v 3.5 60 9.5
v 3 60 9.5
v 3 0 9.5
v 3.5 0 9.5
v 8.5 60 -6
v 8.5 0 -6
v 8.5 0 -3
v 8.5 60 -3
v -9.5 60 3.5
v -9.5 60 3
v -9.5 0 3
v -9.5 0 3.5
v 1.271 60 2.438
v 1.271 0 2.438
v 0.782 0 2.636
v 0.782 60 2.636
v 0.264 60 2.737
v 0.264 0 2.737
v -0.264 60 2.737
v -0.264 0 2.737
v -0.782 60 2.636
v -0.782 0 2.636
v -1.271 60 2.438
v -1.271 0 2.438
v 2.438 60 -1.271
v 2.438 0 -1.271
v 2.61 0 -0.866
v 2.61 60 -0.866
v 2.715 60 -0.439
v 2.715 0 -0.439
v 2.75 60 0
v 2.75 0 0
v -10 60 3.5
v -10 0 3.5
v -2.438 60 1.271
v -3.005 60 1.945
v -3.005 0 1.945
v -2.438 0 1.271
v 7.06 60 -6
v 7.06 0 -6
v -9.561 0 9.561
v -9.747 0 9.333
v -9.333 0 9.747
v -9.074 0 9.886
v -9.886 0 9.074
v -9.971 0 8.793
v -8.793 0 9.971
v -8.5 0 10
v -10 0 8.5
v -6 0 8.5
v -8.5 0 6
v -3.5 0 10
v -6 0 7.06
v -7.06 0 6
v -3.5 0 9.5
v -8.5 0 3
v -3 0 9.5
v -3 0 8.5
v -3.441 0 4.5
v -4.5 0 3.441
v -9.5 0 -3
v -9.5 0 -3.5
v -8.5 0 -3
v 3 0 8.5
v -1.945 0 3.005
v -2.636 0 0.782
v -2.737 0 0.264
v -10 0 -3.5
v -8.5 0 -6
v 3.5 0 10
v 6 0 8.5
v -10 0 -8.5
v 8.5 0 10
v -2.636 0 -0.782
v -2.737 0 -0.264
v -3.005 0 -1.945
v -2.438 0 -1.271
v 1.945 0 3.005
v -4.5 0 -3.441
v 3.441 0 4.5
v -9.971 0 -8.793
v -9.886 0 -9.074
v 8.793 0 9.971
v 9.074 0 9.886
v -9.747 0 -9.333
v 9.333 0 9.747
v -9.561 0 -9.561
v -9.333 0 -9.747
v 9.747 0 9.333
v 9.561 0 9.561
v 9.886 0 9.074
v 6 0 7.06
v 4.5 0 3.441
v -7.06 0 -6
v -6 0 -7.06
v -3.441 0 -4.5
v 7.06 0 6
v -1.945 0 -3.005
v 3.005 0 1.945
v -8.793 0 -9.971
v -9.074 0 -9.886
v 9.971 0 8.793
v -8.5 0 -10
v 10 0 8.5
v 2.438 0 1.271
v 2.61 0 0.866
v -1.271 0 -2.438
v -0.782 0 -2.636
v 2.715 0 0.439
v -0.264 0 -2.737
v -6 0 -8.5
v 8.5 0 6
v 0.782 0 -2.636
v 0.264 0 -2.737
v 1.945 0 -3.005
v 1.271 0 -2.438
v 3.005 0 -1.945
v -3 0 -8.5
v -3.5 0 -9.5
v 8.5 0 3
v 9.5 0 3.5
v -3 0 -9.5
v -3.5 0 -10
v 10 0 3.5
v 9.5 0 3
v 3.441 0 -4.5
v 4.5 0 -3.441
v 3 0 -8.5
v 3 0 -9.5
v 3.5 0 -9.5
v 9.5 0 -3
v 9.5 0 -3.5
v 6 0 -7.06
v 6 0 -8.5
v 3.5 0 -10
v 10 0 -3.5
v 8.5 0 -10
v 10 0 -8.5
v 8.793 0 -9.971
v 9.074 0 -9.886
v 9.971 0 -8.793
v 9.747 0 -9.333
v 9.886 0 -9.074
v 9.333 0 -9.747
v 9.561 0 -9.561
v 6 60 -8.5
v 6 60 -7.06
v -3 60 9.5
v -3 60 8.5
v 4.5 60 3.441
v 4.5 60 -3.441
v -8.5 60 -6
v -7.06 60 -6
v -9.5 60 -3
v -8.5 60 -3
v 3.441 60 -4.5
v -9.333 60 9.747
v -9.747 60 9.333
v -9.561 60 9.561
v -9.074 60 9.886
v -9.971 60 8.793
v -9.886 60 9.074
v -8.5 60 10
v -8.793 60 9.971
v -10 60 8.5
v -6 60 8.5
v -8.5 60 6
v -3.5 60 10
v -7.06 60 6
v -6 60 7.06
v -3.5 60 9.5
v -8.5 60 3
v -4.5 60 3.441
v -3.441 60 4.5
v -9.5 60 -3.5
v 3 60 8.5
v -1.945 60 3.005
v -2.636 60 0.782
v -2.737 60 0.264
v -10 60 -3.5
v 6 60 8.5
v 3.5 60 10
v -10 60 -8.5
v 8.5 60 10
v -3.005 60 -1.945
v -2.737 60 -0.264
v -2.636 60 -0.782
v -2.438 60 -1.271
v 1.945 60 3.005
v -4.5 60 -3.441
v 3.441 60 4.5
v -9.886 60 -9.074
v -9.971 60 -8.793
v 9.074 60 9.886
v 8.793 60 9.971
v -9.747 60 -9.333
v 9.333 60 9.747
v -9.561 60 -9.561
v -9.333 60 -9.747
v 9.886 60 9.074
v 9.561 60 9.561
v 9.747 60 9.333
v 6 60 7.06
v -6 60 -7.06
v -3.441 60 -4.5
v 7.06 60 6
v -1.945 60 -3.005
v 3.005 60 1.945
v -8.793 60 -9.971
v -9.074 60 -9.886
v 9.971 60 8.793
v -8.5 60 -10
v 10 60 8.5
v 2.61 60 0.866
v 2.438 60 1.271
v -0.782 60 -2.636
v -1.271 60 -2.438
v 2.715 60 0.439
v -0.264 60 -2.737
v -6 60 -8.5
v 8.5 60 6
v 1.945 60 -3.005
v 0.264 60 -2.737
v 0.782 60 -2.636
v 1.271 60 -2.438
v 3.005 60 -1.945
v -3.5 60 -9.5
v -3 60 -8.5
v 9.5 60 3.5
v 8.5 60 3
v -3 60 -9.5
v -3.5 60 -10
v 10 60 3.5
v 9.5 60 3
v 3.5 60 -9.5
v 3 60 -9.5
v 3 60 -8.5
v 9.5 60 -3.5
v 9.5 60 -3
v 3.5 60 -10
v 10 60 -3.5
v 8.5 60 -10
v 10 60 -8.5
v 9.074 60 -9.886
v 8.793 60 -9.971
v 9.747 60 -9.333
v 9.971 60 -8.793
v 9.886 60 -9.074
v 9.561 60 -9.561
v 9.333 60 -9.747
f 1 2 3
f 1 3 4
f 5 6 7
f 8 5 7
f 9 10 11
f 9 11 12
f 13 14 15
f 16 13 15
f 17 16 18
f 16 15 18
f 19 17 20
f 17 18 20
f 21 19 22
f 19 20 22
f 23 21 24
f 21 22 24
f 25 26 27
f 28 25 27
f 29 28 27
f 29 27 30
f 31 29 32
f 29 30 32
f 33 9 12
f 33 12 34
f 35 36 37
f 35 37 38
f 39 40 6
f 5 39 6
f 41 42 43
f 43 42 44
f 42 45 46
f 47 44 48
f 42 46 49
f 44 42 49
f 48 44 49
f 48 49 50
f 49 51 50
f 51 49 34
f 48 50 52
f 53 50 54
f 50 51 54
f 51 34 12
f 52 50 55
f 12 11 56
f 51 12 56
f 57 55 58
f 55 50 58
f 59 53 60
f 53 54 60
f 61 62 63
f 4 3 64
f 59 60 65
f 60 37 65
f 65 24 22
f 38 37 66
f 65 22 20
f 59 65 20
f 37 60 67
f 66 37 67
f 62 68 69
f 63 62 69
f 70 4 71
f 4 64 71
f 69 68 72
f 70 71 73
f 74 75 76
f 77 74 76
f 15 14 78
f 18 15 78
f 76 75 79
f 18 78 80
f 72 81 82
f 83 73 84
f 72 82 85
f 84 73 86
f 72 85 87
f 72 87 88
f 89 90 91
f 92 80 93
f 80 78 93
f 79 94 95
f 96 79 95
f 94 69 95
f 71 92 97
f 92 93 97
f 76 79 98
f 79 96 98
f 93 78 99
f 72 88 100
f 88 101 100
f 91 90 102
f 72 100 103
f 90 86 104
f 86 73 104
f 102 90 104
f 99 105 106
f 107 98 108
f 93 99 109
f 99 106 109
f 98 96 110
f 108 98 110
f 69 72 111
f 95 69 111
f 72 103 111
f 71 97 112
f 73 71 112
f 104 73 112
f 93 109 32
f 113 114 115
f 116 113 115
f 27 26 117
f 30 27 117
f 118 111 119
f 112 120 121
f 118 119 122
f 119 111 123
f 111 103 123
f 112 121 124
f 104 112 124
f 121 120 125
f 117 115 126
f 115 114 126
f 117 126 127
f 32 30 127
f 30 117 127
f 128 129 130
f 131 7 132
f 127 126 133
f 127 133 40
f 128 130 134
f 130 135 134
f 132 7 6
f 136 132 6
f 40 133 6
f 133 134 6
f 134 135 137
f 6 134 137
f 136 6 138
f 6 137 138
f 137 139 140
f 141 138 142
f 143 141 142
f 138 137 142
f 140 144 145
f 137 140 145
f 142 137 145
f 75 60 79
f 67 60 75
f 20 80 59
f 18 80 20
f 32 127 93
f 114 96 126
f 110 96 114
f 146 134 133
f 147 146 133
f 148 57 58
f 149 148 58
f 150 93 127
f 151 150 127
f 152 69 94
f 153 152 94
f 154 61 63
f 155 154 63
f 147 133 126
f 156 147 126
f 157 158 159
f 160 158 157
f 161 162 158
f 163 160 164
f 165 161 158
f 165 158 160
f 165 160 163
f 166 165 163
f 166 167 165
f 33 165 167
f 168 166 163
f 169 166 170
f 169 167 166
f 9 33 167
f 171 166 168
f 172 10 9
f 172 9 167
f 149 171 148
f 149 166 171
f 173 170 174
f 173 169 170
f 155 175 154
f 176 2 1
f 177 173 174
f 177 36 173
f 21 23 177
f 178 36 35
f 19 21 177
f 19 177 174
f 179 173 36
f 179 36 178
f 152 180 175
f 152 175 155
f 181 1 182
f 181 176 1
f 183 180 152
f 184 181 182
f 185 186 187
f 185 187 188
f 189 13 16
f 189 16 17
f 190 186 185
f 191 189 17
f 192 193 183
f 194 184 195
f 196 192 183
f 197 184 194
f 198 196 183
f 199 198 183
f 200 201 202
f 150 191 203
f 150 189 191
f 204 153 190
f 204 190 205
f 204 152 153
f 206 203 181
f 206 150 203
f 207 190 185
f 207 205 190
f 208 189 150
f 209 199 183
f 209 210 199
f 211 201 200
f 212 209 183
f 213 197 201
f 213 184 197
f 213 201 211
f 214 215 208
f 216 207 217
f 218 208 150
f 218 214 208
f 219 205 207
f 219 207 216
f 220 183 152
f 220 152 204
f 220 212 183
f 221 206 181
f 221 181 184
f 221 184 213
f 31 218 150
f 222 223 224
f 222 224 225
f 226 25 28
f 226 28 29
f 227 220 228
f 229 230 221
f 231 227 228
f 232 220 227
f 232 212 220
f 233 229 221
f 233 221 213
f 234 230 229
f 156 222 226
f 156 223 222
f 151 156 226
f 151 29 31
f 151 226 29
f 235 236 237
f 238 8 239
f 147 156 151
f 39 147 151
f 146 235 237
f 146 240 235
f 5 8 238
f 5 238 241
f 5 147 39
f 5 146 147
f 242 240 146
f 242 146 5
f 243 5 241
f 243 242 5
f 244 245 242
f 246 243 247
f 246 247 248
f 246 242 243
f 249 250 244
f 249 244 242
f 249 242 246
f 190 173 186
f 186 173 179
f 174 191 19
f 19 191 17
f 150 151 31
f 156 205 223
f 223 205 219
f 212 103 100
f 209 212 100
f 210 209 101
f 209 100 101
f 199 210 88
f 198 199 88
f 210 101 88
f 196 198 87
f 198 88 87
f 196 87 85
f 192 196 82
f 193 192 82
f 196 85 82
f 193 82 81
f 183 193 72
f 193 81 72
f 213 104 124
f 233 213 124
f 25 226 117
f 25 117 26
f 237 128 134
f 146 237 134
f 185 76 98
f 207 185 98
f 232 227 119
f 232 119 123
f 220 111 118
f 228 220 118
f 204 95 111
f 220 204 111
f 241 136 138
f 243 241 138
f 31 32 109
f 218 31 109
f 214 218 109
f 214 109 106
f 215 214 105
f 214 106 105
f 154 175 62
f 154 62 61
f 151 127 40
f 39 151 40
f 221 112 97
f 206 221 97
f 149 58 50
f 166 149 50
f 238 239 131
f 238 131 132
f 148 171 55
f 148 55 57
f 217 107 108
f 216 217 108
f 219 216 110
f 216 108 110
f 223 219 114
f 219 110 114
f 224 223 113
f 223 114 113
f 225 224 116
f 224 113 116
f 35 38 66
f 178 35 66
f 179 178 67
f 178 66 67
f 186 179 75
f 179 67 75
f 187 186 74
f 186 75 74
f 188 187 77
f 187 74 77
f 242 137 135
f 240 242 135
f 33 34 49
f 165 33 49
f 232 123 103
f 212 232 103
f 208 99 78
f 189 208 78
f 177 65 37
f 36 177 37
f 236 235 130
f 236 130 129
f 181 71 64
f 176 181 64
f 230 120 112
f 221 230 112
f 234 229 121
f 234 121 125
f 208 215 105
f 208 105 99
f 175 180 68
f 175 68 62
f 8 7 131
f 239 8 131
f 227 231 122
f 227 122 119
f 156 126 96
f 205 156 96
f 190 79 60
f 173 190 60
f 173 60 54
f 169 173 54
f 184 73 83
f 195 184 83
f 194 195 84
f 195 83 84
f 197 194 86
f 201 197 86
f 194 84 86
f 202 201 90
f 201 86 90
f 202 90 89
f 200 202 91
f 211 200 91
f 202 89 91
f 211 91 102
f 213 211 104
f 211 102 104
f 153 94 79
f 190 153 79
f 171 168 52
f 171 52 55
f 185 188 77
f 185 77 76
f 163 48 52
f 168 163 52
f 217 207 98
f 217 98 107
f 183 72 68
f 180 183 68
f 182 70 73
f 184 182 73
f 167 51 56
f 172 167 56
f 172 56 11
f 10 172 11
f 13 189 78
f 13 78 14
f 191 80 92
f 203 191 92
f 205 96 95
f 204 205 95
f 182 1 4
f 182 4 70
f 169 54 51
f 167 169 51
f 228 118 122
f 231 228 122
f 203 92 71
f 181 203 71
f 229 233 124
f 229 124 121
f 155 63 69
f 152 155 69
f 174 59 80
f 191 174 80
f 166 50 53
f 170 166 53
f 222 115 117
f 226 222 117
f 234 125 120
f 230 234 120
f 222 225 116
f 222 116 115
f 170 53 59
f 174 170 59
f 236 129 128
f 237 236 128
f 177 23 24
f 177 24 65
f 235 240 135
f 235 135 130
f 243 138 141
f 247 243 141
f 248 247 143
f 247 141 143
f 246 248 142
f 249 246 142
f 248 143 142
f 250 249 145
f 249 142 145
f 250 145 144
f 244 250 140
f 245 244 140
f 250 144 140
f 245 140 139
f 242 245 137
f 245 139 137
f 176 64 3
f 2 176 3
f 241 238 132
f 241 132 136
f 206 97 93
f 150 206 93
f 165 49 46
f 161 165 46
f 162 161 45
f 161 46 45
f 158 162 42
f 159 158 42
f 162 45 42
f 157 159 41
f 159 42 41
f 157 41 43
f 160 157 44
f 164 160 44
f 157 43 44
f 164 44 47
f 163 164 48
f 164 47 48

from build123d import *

# Parameters (mm, degrees)
DODANIE_WYCI_GNI_CIE1_DEPTH = 60


with BuildPart() as part:
    # Szkic1 → Dodanie-wyciągnięcie1 (new body)
    with BuildSketch(Plane(origin=(0, 0, 0), x_dir=(1, 0, 0), z_dir=(0, 1, 0))):
        with BuildLine():
            Line((-7.06, 6), (-4.5, 3.440546933))
            Line((-4.5, 3.440546933), (-4.5, 4.5))
            Line((-4.5, 4.5), (-3.440546933, 4.5))
            Line((-3.440546933, 4.5), (-6, 7.06))
            Line((-6, 7.06), (-6, 8.5))
            Line((-6, 8.5), (-3, 8.5))
            Line((-3, 8.5), (-3, 9.5))
            Line((-3, 9.5), (-3.5, 9.5))
            Line((-3.5, 9.5), (-3.5, 10))
            Line((-3.5, 10), (-8.5, 10))
            ThreePointArc((-8.5, 10), (-9.560660172, 9.560660172), (-10, 8.5))
            Line((-10, 8.5), (-10, 3.5))
            Line((-10, 3.5), (-9.5, 3.5))
            Line((-9.5, 3.5), (-9.5, 3))
            Line((-9.5, 3), (-8.5, 3))
            Line((-8.5, 3), (-8.5, 6))
            Line((-8.5, 6), (-7.06, 6))
        make_face()
        with BuildLine():
            Line((4.5, 4.5), (4.5, 3.440546933))
            Line((4.5, 3.440546933), (7.06, 6))
            Line((7.06, 6), (8.5, 6))
            Line((8.5, 6), (8.5, 3))
            Line((8.5, 3), (9.5, 3))
            Line((9.5, 3), (9.5, 3.5))
            Line((9.5, 3.5), (10, 3.5))
            Line((10, 3.5), (10, 8.5))
            ThreePointArc((10, 8.5), (9.560660172, 9.560660172), (8.5, 10))
            Line((8.5, 10), (3.5, 10))
            Line((3.5, 10), (3.5, 9.5))
            Line((3.5, 9.5), (3, 9.5))
            Line((3, 9.5), (3, 8.5))
            Line((3, 8.5), (6, 8.5))
            Line((6, 8.5), (6, 7.06))
            Line((6, 7.06), (3.440546933, 4.5))
            Line((3.440546933, 4.5), (4.5, 4.5))
        make_face()
        Polygon((3.440546933, -4.5), (4.5, -4.5), (4.5, -3.440546933), (4.5, 3.440546933), (4.5, 4.5), (3.440546933, 4.5), (-3.440546933, 4.5), (-4.5, 4.5), (-4.5, 3.440546933), (-4.5, -3.440546933), (-4.5, -4.5), (-3.440546933, -4.5), align=None)
        with BuildLine():
            Line((-3.00520382, 1.944543648), (-1.944543648, 3.00520382))
            Line((-1.944543648, 3.00520382), (-1.271309214, 2.438498079))
            ThreePointArc((-1.271309214, 2.438498079), (0, 2.75), (1.271309214, 2.438498079))
            Line((1.271309214, 2.438498079), (1.944543648, 3.00520382))
            Line((1.944543648, 3.00520382), (3.00520382, 1.944543648))
            Line((3.00520382, 1.944543648), (2.438498079, 1.271309214))
            ThreePointArc((2.438498079, 1.271309214), (2.670989491, 0.654457899), (2.75, 0))
            ThreePointArc((2.75, 0), (2.670989491, -0.654457899), (2.438498079, -1.271309214))
            Line((2.438498079, -1.271309214), (3.00520382, -1.944543648))
            Line((3.00520382, -1.944543648), (1.944543648, -3.00520382))
            Line((1.944543648, -3.00520382), (1.271309214, -2.438498079))
            ThreePointArc((1.271309214, -2.438498079), (0, -2.75), (-1.271309214, -2.438498079))
            Line((-1.271309214, -2.438498079), (-1.944543648, -3.00520382))
            Line((-1.944543648, -3.00520382), (-3.00520382, -1.944543648))
            Line((-3.00520382, -1.944543648), (-2.438498079, -1.271309214))
            ThreePointArc((-2.438498079, -1.271309214), (-2.75, 0), (-2.438498079, 1.271309214))
            Line((-2.438498079, 1.271309214), (-3.00520382, 1.944543648))
        make_face(mode=Mode.SUBTRACT)
        with BuildLine():
            Line((-6, -7.06), (-3.440546933, -4.5))
            Line((-3.440546933, -4.5), (-4.5, -4.5))
            Line((-4.5, -4.5), (-4.5, -3.440546933))
            Line((-4.5, -3.440546933), (-7.06, -6))
            Line((-7.06, -6), (-8.5, -6))
            Line((-8.5, -6), (-8.5, -3))
            Line((-8.5, -3), (-9.5, -3))
            Line((-9.5, -3), (-9.5, -3.5))
            Line((-9.5, -3.5), (-10, -3.5))
            Line((-10, -3.5), (-10, -8.5))
            ThreePointArc((-10, -8.5), (-9.560660172, -9.560660172), (-8.5, -10))
            Line((-8.5, -10), (-3.5, -10))
            Line((-3.5, -10), (-3.5, -9.5))
            Line((-3.5, -9.5), (-3, -9.5))
            Line((-3, -9.5), (-3, -8.5))
            Line((-3, -8.5), (-6, -8.5))
            Line((-6, -8.5), (-6, -7.06))
        make_face()
        with BuildLine():
            Line((4.5, -3.440546933), (4.5, -4.5))
            Line((4.5, -4.5), (3.440546933, -4.5))
            Line((3.440546933, -4.5), (6, -7.06))
            Line((6, -7.06), (6, -8.5))
            Line((6, -8.5), (3, -8.5))
            Line((3, -8.5), (3, -9.5))
            Line((3, -9.5), (3.5, -9.5))
            Line((3.5, -9.5), (3.5, -10))
            Line((3.5, -10), (8.5, -10))
            ThreePointArc((8.5, -10), (9.560660172, -9.560660172), (10, -8.5))
            Line((10, -8.5), (10, -3.5))
            Line((10, -3.5), (9.5, -3.5))
            Line((9.5, -3.5), (9.5, -3))
            Line((9.5, -3), (8.5, -3))
            Line((8.5, -3), (8.5, -6))
            Line((8.5, -6), (7.06, -6))
            Line((7.06, -6), (4.5, -3.440546933))
        make_face()
    extrude(amount=DODANIE_WYCI_GNI_CIE1_DEPTH)


solid = part.part
